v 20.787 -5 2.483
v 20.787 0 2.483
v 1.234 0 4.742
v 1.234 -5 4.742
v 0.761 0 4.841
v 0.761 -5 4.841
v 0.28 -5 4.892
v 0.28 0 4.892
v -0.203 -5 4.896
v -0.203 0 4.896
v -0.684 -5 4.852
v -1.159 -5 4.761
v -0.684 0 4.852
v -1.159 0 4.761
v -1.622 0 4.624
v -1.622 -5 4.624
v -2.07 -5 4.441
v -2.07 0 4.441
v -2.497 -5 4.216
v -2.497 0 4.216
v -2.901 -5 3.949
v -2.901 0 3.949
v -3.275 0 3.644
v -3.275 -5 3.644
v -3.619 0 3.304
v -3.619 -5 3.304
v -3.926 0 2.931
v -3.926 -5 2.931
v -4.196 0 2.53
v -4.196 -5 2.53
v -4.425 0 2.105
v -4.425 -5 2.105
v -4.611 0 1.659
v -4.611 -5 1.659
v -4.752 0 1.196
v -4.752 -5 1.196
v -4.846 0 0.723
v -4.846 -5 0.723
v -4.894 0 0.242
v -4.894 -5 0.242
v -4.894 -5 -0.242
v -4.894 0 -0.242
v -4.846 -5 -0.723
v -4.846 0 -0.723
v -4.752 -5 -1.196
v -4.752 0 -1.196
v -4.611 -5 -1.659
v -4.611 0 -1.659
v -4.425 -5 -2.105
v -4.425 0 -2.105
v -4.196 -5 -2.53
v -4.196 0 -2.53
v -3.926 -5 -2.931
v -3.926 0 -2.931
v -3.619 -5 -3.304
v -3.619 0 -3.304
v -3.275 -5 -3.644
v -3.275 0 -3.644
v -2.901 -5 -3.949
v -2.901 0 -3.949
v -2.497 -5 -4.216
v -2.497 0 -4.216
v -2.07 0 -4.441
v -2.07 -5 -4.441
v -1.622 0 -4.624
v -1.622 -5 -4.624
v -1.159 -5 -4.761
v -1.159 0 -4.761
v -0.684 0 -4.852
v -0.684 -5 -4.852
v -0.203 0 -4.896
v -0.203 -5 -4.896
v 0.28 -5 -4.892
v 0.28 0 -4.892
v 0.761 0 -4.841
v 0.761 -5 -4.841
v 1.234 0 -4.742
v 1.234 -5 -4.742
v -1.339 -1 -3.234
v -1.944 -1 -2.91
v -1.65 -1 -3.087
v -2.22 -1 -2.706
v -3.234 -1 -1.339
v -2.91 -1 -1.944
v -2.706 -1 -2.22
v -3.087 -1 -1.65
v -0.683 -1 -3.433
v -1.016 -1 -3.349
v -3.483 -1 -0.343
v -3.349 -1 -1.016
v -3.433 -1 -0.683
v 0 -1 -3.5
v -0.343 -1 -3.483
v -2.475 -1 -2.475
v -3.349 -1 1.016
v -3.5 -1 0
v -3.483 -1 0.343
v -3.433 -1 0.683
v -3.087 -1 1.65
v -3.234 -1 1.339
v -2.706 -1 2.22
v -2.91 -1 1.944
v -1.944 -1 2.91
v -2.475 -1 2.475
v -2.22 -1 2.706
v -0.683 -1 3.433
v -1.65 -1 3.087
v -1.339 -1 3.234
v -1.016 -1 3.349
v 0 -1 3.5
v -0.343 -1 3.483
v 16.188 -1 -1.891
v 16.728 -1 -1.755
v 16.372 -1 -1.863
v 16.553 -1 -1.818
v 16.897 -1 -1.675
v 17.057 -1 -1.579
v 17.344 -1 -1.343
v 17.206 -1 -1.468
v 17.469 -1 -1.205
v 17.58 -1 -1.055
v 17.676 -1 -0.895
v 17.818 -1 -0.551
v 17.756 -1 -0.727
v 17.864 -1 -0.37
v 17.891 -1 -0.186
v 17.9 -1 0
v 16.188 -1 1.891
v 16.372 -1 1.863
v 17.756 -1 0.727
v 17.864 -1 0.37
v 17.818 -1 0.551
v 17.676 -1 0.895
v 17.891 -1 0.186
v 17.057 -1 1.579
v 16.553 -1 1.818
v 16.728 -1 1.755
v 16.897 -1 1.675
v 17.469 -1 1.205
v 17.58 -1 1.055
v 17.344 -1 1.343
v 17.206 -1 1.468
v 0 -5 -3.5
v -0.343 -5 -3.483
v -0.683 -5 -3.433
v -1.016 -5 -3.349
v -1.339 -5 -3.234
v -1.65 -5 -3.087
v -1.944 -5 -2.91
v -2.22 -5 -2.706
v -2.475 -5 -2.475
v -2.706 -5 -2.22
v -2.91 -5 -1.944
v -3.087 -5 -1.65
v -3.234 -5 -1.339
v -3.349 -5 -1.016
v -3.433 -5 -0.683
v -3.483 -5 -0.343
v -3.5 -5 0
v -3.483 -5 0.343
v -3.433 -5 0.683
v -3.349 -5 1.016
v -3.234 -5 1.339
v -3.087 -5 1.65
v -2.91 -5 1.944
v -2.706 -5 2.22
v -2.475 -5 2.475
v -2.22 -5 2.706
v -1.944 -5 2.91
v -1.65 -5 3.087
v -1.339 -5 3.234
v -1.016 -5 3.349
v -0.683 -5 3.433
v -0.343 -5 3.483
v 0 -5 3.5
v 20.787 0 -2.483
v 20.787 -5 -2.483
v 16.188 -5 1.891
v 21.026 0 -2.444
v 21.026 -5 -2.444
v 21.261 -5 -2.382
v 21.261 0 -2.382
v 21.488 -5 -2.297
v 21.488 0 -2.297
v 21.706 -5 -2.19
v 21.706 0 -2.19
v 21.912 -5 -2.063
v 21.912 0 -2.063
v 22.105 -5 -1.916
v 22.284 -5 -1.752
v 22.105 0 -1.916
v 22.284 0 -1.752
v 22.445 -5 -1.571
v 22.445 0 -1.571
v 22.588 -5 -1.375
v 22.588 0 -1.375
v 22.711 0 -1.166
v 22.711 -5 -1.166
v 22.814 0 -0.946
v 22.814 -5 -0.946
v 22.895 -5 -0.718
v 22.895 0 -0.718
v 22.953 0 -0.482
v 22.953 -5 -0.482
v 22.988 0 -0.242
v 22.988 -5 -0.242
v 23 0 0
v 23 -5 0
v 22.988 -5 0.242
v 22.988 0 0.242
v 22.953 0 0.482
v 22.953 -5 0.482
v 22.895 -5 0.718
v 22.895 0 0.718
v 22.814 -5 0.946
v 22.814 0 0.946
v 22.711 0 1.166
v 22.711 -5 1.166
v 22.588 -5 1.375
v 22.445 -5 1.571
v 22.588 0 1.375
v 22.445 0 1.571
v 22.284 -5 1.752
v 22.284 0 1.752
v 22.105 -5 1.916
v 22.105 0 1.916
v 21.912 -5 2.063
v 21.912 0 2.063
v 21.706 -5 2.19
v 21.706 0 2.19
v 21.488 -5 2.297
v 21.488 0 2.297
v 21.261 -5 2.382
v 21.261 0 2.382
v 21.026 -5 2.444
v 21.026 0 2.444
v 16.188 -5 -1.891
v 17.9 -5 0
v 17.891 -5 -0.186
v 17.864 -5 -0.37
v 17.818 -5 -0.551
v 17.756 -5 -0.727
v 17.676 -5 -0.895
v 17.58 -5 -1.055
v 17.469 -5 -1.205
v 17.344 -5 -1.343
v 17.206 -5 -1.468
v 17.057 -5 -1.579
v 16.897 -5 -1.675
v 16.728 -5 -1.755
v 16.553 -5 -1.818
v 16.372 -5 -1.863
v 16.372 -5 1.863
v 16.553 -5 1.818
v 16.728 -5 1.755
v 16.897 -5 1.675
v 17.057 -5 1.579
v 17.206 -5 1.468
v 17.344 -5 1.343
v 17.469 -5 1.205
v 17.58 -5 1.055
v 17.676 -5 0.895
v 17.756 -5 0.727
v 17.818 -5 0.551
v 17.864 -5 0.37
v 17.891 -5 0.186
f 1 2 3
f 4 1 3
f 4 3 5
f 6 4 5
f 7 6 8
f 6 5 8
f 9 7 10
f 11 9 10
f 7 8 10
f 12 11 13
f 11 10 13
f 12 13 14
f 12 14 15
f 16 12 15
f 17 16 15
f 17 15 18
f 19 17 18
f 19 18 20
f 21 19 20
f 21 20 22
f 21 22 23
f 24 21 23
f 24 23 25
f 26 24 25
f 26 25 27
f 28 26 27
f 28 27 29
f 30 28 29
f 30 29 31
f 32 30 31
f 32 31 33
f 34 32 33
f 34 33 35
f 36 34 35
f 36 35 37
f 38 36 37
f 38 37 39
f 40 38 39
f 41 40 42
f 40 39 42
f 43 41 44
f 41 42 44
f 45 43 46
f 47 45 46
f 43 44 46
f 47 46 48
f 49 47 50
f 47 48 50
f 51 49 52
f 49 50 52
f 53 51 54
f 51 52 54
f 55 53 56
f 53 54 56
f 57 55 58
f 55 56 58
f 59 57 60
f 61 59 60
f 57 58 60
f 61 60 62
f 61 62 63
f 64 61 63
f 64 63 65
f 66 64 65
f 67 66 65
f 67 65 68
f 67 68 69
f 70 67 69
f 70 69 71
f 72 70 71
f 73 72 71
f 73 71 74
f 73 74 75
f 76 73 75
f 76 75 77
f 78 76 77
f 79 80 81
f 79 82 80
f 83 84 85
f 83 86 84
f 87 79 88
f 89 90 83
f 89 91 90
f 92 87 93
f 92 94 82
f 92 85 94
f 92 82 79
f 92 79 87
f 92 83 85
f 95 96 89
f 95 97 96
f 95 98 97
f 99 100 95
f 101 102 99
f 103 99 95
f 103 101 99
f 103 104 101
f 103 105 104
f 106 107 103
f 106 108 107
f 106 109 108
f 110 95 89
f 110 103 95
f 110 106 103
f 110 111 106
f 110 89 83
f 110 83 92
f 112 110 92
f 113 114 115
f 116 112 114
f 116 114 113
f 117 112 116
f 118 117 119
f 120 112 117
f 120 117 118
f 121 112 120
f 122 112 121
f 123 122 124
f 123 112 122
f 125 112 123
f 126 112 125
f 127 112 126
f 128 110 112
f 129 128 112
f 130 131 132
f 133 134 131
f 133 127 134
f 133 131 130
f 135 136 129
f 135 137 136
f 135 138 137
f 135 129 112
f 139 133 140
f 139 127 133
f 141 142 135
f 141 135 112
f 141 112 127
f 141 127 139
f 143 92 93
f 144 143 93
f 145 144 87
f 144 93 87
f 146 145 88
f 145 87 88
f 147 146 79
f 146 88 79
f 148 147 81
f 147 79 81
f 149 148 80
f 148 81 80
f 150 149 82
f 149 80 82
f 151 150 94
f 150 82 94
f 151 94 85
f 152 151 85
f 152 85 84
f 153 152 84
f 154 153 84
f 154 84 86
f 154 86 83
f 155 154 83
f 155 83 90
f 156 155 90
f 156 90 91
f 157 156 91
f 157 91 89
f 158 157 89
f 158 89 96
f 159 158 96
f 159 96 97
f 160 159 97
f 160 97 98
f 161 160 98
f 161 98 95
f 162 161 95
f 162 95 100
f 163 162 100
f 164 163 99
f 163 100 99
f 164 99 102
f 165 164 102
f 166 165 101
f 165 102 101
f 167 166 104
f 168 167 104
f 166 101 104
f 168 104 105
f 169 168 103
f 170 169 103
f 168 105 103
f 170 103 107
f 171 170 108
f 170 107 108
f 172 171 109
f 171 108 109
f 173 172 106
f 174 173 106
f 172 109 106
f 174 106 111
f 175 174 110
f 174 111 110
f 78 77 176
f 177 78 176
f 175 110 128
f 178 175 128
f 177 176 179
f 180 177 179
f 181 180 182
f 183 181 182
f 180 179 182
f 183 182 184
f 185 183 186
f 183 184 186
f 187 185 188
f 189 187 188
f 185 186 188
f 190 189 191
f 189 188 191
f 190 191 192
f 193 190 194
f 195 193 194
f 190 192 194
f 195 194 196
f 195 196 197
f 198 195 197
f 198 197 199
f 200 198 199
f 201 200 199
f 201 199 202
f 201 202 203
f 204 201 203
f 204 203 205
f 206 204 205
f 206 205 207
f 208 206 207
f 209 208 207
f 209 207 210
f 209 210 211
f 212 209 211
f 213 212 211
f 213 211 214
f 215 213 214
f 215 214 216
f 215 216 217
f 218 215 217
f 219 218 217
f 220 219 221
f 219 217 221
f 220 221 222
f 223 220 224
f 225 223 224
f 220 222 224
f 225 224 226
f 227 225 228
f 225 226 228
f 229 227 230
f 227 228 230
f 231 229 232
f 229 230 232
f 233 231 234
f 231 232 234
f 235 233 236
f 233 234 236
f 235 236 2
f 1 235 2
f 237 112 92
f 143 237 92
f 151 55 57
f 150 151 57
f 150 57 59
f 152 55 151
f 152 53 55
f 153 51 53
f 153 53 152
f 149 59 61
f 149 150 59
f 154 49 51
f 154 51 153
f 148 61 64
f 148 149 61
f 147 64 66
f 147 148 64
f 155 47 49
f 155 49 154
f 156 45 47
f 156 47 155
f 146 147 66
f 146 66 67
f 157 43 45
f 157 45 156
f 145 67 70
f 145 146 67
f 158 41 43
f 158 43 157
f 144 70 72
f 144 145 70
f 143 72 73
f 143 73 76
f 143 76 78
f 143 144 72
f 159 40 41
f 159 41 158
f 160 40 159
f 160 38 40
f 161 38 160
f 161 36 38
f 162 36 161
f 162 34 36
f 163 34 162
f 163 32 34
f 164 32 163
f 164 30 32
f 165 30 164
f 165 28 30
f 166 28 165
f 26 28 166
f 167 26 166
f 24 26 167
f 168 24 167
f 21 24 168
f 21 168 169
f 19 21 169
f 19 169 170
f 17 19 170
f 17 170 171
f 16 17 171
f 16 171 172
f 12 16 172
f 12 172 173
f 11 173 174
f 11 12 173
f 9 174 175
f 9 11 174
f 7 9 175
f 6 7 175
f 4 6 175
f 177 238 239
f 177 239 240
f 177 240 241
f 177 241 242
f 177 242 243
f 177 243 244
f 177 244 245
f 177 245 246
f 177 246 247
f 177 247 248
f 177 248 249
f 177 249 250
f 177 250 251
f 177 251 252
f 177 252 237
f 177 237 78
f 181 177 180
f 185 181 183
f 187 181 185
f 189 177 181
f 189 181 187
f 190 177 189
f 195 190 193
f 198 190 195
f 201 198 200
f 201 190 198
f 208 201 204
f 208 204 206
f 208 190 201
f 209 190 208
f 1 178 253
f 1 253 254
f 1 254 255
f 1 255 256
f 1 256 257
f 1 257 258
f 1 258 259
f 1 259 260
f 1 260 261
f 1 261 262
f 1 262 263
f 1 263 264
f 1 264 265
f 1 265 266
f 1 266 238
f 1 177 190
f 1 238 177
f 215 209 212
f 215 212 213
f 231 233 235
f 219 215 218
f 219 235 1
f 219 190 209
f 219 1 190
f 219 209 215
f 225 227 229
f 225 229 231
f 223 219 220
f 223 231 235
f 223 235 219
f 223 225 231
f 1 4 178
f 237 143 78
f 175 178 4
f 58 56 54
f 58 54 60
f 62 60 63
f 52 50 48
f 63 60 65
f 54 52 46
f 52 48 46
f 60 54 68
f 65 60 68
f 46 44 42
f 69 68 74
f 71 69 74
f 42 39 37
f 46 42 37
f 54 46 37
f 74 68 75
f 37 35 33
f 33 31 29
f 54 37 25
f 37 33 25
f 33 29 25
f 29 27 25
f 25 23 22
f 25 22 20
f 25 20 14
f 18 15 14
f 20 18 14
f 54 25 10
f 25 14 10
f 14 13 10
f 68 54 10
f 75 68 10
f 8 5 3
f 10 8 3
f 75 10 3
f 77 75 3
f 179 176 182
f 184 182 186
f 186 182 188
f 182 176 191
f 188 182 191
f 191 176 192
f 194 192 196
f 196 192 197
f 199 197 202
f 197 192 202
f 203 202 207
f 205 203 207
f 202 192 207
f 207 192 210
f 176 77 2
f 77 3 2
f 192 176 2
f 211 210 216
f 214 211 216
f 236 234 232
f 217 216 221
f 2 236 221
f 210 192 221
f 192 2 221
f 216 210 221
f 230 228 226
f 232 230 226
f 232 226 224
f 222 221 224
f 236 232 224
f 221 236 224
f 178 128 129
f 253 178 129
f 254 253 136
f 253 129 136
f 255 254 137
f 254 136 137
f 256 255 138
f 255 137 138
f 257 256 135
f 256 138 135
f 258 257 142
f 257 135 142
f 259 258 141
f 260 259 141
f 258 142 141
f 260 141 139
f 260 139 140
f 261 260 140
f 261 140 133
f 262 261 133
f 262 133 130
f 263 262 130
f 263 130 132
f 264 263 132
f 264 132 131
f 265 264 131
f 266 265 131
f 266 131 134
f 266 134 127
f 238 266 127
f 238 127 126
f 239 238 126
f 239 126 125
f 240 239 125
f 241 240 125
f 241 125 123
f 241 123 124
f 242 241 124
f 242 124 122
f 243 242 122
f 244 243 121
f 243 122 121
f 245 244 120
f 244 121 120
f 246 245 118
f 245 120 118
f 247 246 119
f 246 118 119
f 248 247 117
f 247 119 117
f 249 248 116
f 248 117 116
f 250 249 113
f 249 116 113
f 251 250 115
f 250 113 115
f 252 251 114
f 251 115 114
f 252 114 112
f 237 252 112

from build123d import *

# Parameters (mm, degrees)
F1_DEPTH = 5
F2_DEPTH = 1


# Not quite as in the source:
# - a feature names something its author has since deleted; it is built from what else it names


with BuildPart() as f1:
    # F0 (on Front) → F1 (new body)
    with BuildSketch(Plane.XZ):
        with BuildLine():
            Line((1.2337693236, -4.7421317207), (20.7868759001, -2.4834859005))
            ThreePointArc((20.7868759001, -2.4834859005), (23, 0), (20.7868759001, 2.4834859005))
            Line((20.7868759001, 2.4834859005), (1.2337693236, 4.7421317207))
            ThreePointArc((1.2337693236, 4.7421317207), (-4.9, 0), (1.2337693236, -4.7421317207))
        make_face()
        with BuildLine():
            ThreePointArc((0, -3.5), (-3.5, 0), (0, 3.5))
            Line((0, 3.5), (16.1879612334, 1.8906799239))
            ThreePointArc((16.1879612334, 1.8906799239), (17.9, 0), (16.1879612334, -1.8906799239))
            Line((16.1879612334, -1.8906799239), (0, -3.5))
        make_face(mode=Mode.SUBTRACT)
    extrude(amount=F1_DEPTH)

    # F0 (on Front) → F2 (join)
    with BuildSketch(Plane.XZ):
        with BuildLine():
            Line((1.2337693236, -4.7421317207), (20.7868759001, -2.4834859005))
            ThreePointArc((20.7868759001, -2.4834859005), (23, 0), (20.7868759001, 2.4834859005))
            Line((20.7868759001, 2.4834859005), (1.2337693236, 4.7421317207))
            ThreePointArc((1.2337693236, 4.7421317207), (-4.9, 0), (1.2337693236, -4.7421317207))
        make_face()
        with BuildLine():
            ThreePointArc((0, -3.5), (-3.5, 0), (0, 3.5))
            Line((0, 3.5), (16.1879612334, 1.8906799239))
            ThreePointArc((16.1879612334, 1.8906799239), (17.9, 0), (16.1879612334, -1.8906799239))
            Line((16.1879612334, -1.8906799239), (0, -3.5))
        make_face(mode=Mode.SUBTRACT)
        with BuildLine():
            Line((16.1879612334, 1.8906799239), (0, 3.5))
            ThreePointArc((0, 3.5), (-3.5, 0), (0, -3.5))
            Line((0, -3.5), (16.1879612334, -1.8906799239))
            ThreePointArc((16.1879612334, -1.8906799239), (17.9, 0), (16.1879612334, 1.8906799239))
        make_face()
    extrude(amount=F2_DEPTH)


solid = f1.part
